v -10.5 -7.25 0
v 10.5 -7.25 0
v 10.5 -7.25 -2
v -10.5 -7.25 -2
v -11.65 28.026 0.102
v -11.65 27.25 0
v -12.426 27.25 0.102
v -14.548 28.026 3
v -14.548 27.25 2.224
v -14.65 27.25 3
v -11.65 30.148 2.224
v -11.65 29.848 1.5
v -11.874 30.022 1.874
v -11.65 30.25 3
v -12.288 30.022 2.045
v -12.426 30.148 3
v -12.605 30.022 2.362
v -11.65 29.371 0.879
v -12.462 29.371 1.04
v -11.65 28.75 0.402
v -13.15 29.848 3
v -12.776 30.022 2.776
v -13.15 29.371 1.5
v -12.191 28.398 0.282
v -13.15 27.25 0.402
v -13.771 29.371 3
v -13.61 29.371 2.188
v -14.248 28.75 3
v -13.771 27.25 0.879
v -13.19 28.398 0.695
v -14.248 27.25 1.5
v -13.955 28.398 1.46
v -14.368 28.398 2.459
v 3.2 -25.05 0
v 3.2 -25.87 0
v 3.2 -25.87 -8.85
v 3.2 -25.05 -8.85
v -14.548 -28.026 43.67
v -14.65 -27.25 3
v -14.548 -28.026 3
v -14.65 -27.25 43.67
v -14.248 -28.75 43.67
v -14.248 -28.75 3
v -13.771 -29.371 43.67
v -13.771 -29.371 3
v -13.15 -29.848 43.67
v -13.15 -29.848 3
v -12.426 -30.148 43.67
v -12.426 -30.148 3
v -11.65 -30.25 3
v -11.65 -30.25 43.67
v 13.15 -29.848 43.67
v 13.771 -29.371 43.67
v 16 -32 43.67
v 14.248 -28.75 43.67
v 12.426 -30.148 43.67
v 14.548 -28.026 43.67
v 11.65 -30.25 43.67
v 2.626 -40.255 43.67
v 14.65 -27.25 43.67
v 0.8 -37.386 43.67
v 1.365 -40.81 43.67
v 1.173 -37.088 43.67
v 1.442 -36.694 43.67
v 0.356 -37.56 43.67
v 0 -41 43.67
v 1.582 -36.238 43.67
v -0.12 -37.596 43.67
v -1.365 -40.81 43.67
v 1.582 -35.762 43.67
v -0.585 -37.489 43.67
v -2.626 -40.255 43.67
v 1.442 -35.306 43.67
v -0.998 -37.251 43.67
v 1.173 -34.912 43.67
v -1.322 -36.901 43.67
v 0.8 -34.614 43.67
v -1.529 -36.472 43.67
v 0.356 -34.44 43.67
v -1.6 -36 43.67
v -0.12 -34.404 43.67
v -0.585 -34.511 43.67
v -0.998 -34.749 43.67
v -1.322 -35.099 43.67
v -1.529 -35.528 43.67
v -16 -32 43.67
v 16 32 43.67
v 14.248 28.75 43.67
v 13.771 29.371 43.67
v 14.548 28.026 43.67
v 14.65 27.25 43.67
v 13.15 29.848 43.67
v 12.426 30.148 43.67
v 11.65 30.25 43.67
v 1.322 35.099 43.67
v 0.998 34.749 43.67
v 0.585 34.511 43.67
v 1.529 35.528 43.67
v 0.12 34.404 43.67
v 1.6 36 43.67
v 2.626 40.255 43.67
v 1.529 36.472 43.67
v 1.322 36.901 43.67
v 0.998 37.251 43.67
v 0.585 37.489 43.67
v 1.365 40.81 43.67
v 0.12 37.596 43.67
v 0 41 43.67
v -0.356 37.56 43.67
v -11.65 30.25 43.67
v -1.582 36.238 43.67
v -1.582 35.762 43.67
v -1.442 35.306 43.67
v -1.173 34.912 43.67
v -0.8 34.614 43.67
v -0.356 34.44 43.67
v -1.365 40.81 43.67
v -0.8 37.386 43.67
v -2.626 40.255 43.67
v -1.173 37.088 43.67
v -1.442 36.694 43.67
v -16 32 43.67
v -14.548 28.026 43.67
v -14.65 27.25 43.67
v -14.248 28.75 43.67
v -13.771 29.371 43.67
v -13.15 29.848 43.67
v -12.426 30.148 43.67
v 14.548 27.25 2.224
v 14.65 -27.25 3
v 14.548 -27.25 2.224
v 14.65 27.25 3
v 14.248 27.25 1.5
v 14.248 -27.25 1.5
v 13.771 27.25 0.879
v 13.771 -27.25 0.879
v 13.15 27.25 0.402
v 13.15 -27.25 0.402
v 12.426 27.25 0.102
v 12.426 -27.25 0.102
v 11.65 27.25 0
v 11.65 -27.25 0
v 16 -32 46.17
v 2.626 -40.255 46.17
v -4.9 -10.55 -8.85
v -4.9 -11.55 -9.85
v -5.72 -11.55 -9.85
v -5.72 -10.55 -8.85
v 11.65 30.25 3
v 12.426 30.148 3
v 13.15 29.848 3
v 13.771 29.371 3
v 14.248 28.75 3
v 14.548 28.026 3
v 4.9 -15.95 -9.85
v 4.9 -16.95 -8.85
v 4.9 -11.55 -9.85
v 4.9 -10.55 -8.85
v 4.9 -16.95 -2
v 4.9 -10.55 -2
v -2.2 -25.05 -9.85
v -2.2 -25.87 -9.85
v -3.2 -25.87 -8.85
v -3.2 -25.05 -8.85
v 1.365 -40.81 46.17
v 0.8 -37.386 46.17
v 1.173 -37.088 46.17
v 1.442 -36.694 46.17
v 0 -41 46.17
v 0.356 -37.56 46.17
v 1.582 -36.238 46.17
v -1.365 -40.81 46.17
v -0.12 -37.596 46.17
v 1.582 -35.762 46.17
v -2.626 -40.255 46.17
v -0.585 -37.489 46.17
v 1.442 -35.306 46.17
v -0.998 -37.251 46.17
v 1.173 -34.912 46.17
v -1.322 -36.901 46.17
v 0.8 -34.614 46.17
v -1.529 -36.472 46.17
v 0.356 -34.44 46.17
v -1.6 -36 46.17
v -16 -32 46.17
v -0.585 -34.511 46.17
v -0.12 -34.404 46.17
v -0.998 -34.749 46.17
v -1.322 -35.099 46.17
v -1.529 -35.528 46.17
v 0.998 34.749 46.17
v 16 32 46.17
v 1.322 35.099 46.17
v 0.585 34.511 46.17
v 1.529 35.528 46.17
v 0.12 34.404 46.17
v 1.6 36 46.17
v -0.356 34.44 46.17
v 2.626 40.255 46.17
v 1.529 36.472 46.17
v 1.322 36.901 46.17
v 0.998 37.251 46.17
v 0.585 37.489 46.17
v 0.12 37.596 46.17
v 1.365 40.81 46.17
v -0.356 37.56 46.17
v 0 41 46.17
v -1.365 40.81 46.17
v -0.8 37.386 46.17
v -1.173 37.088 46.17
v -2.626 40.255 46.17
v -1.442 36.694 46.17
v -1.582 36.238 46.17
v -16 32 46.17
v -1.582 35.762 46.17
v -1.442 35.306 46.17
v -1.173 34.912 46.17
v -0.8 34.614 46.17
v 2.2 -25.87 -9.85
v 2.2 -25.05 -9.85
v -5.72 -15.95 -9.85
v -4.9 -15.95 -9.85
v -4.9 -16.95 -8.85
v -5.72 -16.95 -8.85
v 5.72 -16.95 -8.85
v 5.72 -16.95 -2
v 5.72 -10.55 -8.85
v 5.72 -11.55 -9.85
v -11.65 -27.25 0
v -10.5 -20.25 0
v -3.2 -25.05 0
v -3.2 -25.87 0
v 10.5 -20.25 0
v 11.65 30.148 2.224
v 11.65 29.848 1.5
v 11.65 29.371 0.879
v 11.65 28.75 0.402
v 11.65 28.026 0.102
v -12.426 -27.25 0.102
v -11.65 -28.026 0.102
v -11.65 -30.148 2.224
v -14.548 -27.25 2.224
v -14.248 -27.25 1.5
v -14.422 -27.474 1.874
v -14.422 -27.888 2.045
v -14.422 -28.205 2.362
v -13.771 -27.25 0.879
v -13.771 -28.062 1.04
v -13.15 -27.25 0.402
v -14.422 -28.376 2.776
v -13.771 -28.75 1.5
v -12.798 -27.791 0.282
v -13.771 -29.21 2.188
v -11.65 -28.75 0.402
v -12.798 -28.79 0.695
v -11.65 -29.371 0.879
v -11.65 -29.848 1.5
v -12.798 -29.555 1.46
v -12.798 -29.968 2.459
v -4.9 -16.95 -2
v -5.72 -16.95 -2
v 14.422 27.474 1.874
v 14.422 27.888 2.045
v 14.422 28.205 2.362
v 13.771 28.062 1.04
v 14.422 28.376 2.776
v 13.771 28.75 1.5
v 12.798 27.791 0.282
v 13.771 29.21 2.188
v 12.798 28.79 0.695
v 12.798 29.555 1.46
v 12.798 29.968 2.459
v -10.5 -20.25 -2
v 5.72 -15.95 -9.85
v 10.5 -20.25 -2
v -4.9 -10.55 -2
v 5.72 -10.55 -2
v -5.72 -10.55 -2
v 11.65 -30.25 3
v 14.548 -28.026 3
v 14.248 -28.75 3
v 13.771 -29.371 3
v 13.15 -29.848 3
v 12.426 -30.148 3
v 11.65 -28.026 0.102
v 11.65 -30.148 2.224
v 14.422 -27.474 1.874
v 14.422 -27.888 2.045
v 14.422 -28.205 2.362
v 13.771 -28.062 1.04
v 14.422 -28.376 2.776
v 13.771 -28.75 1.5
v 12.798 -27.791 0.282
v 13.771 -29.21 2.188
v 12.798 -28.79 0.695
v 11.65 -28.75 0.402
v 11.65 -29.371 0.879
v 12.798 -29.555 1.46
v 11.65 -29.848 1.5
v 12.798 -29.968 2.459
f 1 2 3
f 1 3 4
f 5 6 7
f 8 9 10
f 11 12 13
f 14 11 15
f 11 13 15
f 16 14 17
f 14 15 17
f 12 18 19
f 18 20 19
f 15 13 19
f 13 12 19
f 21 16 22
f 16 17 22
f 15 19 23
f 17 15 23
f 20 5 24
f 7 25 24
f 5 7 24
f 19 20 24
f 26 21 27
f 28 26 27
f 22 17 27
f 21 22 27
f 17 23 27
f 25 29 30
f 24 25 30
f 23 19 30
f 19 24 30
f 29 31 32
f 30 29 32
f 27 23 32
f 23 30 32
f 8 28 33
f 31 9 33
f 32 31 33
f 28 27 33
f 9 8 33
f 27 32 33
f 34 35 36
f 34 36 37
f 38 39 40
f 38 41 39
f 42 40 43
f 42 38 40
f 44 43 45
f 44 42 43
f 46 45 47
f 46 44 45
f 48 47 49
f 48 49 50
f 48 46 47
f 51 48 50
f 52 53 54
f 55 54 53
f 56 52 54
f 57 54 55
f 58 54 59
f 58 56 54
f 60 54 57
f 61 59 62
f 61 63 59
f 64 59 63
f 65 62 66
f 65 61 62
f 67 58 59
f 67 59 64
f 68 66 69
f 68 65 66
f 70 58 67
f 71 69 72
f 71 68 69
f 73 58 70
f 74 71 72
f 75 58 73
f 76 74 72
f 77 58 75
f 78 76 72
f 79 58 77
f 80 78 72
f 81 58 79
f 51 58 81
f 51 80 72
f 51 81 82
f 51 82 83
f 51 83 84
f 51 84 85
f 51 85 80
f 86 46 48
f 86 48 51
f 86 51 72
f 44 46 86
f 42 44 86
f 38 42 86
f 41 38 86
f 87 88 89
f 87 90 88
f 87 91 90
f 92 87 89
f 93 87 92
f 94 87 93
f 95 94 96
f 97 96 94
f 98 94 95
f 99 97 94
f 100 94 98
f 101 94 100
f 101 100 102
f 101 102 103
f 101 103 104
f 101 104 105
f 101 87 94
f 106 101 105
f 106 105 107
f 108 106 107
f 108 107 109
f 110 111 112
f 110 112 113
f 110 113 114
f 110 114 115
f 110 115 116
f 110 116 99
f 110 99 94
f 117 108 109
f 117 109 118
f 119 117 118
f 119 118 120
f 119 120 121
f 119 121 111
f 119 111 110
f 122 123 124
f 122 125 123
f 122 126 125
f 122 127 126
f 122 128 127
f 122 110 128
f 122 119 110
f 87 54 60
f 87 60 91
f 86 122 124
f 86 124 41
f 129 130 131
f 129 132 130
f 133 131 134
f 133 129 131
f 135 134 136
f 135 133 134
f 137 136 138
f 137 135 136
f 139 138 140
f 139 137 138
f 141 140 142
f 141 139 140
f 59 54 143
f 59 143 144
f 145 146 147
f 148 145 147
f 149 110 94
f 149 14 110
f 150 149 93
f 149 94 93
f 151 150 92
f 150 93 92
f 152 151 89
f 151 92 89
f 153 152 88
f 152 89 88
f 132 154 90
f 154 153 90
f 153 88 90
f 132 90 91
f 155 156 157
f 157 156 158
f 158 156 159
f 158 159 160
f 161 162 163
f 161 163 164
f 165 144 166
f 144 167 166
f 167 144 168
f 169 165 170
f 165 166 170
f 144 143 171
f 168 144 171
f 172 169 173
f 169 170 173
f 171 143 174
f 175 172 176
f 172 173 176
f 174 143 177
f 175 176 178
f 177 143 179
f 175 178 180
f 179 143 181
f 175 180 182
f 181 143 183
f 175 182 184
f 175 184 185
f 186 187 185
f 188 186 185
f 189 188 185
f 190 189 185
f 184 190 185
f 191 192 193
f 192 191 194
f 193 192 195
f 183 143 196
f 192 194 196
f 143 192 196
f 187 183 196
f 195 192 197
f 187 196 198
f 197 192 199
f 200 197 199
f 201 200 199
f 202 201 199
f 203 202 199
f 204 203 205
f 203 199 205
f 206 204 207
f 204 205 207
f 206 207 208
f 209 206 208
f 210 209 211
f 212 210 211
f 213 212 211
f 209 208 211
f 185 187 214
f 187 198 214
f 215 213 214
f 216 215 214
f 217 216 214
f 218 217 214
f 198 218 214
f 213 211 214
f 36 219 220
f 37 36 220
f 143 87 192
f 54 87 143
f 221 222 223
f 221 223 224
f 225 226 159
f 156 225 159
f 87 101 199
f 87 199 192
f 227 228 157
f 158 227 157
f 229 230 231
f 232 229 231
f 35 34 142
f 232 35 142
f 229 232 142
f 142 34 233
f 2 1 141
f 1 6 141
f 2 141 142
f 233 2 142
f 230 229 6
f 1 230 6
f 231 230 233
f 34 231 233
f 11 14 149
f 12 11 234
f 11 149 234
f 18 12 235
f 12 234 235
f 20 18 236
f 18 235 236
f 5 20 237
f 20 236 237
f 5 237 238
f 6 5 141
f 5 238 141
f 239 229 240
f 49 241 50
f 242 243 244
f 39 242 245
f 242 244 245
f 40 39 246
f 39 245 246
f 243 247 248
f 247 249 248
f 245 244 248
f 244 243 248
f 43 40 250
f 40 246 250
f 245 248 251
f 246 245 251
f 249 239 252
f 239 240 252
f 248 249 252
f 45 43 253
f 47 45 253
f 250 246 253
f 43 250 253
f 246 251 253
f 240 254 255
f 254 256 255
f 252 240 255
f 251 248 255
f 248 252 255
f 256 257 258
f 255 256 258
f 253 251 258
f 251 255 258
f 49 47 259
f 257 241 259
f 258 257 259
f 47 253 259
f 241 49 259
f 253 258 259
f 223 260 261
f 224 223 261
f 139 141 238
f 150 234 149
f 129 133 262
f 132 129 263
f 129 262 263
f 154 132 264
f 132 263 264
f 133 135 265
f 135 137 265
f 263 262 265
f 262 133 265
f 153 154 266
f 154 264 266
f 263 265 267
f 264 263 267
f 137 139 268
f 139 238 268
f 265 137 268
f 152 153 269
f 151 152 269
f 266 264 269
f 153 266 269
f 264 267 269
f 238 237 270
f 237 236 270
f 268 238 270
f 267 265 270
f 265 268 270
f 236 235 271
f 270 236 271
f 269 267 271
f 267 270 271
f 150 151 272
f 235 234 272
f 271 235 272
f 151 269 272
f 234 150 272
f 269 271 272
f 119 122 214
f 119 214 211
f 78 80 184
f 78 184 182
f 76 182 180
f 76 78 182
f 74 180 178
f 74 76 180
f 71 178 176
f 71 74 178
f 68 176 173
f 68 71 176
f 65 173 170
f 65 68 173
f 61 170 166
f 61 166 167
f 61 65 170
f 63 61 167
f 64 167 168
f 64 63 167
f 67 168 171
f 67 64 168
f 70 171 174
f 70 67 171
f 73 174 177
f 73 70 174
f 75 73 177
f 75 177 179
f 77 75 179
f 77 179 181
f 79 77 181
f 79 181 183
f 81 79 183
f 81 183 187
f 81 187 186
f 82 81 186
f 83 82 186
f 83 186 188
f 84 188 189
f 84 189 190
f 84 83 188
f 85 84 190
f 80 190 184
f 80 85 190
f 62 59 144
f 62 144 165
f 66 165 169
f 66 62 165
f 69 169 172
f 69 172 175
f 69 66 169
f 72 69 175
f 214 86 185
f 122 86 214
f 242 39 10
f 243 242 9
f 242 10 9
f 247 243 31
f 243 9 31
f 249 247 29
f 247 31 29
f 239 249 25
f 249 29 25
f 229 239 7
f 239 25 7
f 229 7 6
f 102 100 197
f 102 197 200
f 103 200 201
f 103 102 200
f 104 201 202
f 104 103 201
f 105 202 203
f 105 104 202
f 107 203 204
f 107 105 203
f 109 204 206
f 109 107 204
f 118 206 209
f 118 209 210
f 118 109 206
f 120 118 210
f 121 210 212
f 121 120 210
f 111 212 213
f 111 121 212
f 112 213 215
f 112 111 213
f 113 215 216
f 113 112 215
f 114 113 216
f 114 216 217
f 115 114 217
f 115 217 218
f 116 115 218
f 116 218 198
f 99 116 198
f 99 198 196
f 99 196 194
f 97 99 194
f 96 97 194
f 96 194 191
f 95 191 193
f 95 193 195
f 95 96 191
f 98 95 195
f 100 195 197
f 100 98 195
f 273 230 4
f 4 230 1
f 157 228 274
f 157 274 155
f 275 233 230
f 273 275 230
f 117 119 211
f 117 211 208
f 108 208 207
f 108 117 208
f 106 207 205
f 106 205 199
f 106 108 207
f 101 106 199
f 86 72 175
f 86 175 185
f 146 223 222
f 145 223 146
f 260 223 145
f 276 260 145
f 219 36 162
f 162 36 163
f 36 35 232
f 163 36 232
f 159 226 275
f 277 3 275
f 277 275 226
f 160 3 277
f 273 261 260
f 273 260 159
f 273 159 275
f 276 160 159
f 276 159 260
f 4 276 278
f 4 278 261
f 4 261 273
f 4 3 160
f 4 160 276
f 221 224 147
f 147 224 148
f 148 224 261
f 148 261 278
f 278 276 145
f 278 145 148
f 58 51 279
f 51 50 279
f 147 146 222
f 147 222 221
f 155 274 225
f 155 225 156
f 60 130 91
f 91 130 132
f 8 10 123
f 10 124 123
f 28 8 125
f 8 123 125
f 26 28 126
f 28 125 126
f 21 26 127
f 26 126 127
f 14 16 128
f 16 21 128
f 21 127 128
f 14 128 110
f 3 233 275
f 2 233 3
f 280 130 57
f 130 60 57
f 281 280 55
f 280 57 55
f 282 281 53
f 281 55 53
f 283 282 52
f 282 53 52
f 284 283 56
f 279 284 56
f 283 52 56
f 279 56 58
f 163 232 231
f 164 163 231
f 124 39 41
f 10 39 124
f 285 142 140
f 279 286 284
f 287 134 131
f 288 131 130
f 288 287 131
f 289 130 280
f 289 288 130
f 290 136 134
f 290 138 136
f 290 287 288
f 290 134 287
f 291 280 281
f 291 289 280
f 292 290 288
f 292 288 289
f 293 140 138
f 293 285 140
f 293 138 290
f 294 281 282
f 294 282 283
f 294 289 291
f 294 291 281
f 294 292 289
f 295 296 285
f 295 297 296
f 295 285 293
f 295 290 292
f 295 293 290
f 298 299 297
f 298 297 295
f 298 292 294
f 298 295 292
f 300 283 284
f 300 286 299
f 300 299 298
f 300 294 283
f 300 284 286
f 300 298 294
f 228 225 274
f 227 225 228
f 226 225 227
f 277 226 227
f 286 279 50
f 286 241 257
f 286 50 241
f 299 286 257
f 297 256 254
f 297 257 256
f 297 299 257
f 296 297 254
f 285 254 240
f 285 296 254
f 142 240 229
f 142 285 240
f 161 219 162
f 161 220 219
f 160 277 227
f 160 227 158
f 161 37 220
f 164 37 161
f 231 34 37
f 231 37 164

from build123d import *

# Parameters (mm, degrees)
SKETCH1_W           = 29.3
SKETCH1_H           = 60.5
BOSS_EXTRUDE1_DEPTH = 43.67
SKETCH2_R           = 1.6
BOSS_EXTRUDE2_DEPTH = 2.5
FILLET1_R           = 3
SKETCH3_W           = 21
SKETCH3_H           = 13
BOSS_EXTRUDE3_DEPTH = 2
SKETCH4_W           = 0.82
SKETCH4_H           = 6.4
BOSS_EXTRUDE4_DEPTH = 7.85
SKETCH5_W           = 6.4
SKETCH5_H           = 0.82
BOSS_EXTRUDE5_DEPTH = 9.85
CHAMFER1_SIZE       = 1


with BuildPart() as part:
    # Sketch1 → Boss-Extrude1 (new body)
    with BuildSketch(Plane.XY):
        Rectangle(SKETCH1_W, SKETCH1_H)
    extrude(amount=BOSS_EXTRUDE1_DEPTH)

    # Sketch2 → Boss-Extrude2 (add)
    with BuildSketch(Plane.XY.offset(43.67)):
        with BuildLine():
            Line((-16, 32), (-2.62619365, 40.254774602))
            ThreePointArc((-2.62619365, 40.254774602), (0, 41), (2.62619365, 40.254774602))
            Line((2.62619365, 40.254774602), (16, 32))
            Line((16, 32), (16, -32))
            Line((16, -32), (2.62619365, -40.254774602))
            ThreePointArc((2.62619365, -40.254774602), (0, -41), (-2.62619365, -40.254774602))
            Line((-2.62619365, -40.254774602), (-16, -32))
            Line((-16, -32), (-16, 32))
        make_face()
        with Locations((0, 36)):
            Circle(SKETCH2_R, mode=Mode.SUBTRACT)
        with Locations(Location((0, -36, 0), (0, 0, 180))):
            Circle(SKETCH2_R, mode=Mode.SUBTRACT)
    extrude(amount=BOSS_EXTRUDE2_DEPTH)

    # Fillet1
    fillet1_edges = [part.edges().sort_by_distance(p)[0] for p in [
        (0, -30.25, 0),
        (-14.65, 0, 0),
        (0, 30.25, 0),
        (14.65, 0, 0),
        (14.65, -30.25, 21.835),
        (-14.65, -30.25, 21.835),
        (-14.65, 30.25, 21.835),
        (14.65, 30.25, 21.835),
    ]]
    fillet(fillet1_edges, radius=FILLET1_R)

    # Sketch3 → Boss-Extrude3 (add)
    with BuildSketch(Plane(origin=(0, 0, 0), x_dir=(-1, 0, 0), z_dir=(0, 0, -1))):
        with Locations((0, -13.75)):
            Rectangle(SKETCH3_W, SKETCH3_H)
    extrude(amount=BOSS_EXTRUDE3_DEPTH)

    # Sketch4 → Boss-Extrude4 (add)
    with BuildSketch(Plane(origin=(0, 0, -2), x_dir=(-1, 0, 0), z_dir=(0, 0, -1))):
        with Locations((-5.31, -13.75)):
            Rectangle(SKETCH4_W, SKETCH4_H)
        with Locations((5.31, -13.75)):
            Rectangle(SKETCH4_W, SKETCH4_H)
    extrude(amount=BOSS_EXTRUDE4_DEPTH)

    # Sketch5 → Boss-Extrude5 (add)
    with BuildSketch(Plane(origin=(0, 0, 0), x_dir=(-1, 0, 0), z_dir=(0, 0, -1))):
        with Locations((0, -25.46)):
            Rectangle(SKETCH5_W, SKETCH5_H)
    extrude(amount=BOSS_EXTRUDE5_DEPTH)

    # Chamfer1
    chamfer1_edges = [part.edges().sort_by_distance(p)[0] for p in [
        (-5.31, -16.95, -9.85),
        (-5.31, -10.55, -9.85),
        (-3.2, -25.46, -9.85),
        (3.2, -25.46, -9.85),
        (5.31, -16.95, -9.85),
        (5.31, -10.55, -9.85),
    ]]
    chamfer(chamfer1_edges, length=CHAMFER1_SIZE)


solid = part.part
